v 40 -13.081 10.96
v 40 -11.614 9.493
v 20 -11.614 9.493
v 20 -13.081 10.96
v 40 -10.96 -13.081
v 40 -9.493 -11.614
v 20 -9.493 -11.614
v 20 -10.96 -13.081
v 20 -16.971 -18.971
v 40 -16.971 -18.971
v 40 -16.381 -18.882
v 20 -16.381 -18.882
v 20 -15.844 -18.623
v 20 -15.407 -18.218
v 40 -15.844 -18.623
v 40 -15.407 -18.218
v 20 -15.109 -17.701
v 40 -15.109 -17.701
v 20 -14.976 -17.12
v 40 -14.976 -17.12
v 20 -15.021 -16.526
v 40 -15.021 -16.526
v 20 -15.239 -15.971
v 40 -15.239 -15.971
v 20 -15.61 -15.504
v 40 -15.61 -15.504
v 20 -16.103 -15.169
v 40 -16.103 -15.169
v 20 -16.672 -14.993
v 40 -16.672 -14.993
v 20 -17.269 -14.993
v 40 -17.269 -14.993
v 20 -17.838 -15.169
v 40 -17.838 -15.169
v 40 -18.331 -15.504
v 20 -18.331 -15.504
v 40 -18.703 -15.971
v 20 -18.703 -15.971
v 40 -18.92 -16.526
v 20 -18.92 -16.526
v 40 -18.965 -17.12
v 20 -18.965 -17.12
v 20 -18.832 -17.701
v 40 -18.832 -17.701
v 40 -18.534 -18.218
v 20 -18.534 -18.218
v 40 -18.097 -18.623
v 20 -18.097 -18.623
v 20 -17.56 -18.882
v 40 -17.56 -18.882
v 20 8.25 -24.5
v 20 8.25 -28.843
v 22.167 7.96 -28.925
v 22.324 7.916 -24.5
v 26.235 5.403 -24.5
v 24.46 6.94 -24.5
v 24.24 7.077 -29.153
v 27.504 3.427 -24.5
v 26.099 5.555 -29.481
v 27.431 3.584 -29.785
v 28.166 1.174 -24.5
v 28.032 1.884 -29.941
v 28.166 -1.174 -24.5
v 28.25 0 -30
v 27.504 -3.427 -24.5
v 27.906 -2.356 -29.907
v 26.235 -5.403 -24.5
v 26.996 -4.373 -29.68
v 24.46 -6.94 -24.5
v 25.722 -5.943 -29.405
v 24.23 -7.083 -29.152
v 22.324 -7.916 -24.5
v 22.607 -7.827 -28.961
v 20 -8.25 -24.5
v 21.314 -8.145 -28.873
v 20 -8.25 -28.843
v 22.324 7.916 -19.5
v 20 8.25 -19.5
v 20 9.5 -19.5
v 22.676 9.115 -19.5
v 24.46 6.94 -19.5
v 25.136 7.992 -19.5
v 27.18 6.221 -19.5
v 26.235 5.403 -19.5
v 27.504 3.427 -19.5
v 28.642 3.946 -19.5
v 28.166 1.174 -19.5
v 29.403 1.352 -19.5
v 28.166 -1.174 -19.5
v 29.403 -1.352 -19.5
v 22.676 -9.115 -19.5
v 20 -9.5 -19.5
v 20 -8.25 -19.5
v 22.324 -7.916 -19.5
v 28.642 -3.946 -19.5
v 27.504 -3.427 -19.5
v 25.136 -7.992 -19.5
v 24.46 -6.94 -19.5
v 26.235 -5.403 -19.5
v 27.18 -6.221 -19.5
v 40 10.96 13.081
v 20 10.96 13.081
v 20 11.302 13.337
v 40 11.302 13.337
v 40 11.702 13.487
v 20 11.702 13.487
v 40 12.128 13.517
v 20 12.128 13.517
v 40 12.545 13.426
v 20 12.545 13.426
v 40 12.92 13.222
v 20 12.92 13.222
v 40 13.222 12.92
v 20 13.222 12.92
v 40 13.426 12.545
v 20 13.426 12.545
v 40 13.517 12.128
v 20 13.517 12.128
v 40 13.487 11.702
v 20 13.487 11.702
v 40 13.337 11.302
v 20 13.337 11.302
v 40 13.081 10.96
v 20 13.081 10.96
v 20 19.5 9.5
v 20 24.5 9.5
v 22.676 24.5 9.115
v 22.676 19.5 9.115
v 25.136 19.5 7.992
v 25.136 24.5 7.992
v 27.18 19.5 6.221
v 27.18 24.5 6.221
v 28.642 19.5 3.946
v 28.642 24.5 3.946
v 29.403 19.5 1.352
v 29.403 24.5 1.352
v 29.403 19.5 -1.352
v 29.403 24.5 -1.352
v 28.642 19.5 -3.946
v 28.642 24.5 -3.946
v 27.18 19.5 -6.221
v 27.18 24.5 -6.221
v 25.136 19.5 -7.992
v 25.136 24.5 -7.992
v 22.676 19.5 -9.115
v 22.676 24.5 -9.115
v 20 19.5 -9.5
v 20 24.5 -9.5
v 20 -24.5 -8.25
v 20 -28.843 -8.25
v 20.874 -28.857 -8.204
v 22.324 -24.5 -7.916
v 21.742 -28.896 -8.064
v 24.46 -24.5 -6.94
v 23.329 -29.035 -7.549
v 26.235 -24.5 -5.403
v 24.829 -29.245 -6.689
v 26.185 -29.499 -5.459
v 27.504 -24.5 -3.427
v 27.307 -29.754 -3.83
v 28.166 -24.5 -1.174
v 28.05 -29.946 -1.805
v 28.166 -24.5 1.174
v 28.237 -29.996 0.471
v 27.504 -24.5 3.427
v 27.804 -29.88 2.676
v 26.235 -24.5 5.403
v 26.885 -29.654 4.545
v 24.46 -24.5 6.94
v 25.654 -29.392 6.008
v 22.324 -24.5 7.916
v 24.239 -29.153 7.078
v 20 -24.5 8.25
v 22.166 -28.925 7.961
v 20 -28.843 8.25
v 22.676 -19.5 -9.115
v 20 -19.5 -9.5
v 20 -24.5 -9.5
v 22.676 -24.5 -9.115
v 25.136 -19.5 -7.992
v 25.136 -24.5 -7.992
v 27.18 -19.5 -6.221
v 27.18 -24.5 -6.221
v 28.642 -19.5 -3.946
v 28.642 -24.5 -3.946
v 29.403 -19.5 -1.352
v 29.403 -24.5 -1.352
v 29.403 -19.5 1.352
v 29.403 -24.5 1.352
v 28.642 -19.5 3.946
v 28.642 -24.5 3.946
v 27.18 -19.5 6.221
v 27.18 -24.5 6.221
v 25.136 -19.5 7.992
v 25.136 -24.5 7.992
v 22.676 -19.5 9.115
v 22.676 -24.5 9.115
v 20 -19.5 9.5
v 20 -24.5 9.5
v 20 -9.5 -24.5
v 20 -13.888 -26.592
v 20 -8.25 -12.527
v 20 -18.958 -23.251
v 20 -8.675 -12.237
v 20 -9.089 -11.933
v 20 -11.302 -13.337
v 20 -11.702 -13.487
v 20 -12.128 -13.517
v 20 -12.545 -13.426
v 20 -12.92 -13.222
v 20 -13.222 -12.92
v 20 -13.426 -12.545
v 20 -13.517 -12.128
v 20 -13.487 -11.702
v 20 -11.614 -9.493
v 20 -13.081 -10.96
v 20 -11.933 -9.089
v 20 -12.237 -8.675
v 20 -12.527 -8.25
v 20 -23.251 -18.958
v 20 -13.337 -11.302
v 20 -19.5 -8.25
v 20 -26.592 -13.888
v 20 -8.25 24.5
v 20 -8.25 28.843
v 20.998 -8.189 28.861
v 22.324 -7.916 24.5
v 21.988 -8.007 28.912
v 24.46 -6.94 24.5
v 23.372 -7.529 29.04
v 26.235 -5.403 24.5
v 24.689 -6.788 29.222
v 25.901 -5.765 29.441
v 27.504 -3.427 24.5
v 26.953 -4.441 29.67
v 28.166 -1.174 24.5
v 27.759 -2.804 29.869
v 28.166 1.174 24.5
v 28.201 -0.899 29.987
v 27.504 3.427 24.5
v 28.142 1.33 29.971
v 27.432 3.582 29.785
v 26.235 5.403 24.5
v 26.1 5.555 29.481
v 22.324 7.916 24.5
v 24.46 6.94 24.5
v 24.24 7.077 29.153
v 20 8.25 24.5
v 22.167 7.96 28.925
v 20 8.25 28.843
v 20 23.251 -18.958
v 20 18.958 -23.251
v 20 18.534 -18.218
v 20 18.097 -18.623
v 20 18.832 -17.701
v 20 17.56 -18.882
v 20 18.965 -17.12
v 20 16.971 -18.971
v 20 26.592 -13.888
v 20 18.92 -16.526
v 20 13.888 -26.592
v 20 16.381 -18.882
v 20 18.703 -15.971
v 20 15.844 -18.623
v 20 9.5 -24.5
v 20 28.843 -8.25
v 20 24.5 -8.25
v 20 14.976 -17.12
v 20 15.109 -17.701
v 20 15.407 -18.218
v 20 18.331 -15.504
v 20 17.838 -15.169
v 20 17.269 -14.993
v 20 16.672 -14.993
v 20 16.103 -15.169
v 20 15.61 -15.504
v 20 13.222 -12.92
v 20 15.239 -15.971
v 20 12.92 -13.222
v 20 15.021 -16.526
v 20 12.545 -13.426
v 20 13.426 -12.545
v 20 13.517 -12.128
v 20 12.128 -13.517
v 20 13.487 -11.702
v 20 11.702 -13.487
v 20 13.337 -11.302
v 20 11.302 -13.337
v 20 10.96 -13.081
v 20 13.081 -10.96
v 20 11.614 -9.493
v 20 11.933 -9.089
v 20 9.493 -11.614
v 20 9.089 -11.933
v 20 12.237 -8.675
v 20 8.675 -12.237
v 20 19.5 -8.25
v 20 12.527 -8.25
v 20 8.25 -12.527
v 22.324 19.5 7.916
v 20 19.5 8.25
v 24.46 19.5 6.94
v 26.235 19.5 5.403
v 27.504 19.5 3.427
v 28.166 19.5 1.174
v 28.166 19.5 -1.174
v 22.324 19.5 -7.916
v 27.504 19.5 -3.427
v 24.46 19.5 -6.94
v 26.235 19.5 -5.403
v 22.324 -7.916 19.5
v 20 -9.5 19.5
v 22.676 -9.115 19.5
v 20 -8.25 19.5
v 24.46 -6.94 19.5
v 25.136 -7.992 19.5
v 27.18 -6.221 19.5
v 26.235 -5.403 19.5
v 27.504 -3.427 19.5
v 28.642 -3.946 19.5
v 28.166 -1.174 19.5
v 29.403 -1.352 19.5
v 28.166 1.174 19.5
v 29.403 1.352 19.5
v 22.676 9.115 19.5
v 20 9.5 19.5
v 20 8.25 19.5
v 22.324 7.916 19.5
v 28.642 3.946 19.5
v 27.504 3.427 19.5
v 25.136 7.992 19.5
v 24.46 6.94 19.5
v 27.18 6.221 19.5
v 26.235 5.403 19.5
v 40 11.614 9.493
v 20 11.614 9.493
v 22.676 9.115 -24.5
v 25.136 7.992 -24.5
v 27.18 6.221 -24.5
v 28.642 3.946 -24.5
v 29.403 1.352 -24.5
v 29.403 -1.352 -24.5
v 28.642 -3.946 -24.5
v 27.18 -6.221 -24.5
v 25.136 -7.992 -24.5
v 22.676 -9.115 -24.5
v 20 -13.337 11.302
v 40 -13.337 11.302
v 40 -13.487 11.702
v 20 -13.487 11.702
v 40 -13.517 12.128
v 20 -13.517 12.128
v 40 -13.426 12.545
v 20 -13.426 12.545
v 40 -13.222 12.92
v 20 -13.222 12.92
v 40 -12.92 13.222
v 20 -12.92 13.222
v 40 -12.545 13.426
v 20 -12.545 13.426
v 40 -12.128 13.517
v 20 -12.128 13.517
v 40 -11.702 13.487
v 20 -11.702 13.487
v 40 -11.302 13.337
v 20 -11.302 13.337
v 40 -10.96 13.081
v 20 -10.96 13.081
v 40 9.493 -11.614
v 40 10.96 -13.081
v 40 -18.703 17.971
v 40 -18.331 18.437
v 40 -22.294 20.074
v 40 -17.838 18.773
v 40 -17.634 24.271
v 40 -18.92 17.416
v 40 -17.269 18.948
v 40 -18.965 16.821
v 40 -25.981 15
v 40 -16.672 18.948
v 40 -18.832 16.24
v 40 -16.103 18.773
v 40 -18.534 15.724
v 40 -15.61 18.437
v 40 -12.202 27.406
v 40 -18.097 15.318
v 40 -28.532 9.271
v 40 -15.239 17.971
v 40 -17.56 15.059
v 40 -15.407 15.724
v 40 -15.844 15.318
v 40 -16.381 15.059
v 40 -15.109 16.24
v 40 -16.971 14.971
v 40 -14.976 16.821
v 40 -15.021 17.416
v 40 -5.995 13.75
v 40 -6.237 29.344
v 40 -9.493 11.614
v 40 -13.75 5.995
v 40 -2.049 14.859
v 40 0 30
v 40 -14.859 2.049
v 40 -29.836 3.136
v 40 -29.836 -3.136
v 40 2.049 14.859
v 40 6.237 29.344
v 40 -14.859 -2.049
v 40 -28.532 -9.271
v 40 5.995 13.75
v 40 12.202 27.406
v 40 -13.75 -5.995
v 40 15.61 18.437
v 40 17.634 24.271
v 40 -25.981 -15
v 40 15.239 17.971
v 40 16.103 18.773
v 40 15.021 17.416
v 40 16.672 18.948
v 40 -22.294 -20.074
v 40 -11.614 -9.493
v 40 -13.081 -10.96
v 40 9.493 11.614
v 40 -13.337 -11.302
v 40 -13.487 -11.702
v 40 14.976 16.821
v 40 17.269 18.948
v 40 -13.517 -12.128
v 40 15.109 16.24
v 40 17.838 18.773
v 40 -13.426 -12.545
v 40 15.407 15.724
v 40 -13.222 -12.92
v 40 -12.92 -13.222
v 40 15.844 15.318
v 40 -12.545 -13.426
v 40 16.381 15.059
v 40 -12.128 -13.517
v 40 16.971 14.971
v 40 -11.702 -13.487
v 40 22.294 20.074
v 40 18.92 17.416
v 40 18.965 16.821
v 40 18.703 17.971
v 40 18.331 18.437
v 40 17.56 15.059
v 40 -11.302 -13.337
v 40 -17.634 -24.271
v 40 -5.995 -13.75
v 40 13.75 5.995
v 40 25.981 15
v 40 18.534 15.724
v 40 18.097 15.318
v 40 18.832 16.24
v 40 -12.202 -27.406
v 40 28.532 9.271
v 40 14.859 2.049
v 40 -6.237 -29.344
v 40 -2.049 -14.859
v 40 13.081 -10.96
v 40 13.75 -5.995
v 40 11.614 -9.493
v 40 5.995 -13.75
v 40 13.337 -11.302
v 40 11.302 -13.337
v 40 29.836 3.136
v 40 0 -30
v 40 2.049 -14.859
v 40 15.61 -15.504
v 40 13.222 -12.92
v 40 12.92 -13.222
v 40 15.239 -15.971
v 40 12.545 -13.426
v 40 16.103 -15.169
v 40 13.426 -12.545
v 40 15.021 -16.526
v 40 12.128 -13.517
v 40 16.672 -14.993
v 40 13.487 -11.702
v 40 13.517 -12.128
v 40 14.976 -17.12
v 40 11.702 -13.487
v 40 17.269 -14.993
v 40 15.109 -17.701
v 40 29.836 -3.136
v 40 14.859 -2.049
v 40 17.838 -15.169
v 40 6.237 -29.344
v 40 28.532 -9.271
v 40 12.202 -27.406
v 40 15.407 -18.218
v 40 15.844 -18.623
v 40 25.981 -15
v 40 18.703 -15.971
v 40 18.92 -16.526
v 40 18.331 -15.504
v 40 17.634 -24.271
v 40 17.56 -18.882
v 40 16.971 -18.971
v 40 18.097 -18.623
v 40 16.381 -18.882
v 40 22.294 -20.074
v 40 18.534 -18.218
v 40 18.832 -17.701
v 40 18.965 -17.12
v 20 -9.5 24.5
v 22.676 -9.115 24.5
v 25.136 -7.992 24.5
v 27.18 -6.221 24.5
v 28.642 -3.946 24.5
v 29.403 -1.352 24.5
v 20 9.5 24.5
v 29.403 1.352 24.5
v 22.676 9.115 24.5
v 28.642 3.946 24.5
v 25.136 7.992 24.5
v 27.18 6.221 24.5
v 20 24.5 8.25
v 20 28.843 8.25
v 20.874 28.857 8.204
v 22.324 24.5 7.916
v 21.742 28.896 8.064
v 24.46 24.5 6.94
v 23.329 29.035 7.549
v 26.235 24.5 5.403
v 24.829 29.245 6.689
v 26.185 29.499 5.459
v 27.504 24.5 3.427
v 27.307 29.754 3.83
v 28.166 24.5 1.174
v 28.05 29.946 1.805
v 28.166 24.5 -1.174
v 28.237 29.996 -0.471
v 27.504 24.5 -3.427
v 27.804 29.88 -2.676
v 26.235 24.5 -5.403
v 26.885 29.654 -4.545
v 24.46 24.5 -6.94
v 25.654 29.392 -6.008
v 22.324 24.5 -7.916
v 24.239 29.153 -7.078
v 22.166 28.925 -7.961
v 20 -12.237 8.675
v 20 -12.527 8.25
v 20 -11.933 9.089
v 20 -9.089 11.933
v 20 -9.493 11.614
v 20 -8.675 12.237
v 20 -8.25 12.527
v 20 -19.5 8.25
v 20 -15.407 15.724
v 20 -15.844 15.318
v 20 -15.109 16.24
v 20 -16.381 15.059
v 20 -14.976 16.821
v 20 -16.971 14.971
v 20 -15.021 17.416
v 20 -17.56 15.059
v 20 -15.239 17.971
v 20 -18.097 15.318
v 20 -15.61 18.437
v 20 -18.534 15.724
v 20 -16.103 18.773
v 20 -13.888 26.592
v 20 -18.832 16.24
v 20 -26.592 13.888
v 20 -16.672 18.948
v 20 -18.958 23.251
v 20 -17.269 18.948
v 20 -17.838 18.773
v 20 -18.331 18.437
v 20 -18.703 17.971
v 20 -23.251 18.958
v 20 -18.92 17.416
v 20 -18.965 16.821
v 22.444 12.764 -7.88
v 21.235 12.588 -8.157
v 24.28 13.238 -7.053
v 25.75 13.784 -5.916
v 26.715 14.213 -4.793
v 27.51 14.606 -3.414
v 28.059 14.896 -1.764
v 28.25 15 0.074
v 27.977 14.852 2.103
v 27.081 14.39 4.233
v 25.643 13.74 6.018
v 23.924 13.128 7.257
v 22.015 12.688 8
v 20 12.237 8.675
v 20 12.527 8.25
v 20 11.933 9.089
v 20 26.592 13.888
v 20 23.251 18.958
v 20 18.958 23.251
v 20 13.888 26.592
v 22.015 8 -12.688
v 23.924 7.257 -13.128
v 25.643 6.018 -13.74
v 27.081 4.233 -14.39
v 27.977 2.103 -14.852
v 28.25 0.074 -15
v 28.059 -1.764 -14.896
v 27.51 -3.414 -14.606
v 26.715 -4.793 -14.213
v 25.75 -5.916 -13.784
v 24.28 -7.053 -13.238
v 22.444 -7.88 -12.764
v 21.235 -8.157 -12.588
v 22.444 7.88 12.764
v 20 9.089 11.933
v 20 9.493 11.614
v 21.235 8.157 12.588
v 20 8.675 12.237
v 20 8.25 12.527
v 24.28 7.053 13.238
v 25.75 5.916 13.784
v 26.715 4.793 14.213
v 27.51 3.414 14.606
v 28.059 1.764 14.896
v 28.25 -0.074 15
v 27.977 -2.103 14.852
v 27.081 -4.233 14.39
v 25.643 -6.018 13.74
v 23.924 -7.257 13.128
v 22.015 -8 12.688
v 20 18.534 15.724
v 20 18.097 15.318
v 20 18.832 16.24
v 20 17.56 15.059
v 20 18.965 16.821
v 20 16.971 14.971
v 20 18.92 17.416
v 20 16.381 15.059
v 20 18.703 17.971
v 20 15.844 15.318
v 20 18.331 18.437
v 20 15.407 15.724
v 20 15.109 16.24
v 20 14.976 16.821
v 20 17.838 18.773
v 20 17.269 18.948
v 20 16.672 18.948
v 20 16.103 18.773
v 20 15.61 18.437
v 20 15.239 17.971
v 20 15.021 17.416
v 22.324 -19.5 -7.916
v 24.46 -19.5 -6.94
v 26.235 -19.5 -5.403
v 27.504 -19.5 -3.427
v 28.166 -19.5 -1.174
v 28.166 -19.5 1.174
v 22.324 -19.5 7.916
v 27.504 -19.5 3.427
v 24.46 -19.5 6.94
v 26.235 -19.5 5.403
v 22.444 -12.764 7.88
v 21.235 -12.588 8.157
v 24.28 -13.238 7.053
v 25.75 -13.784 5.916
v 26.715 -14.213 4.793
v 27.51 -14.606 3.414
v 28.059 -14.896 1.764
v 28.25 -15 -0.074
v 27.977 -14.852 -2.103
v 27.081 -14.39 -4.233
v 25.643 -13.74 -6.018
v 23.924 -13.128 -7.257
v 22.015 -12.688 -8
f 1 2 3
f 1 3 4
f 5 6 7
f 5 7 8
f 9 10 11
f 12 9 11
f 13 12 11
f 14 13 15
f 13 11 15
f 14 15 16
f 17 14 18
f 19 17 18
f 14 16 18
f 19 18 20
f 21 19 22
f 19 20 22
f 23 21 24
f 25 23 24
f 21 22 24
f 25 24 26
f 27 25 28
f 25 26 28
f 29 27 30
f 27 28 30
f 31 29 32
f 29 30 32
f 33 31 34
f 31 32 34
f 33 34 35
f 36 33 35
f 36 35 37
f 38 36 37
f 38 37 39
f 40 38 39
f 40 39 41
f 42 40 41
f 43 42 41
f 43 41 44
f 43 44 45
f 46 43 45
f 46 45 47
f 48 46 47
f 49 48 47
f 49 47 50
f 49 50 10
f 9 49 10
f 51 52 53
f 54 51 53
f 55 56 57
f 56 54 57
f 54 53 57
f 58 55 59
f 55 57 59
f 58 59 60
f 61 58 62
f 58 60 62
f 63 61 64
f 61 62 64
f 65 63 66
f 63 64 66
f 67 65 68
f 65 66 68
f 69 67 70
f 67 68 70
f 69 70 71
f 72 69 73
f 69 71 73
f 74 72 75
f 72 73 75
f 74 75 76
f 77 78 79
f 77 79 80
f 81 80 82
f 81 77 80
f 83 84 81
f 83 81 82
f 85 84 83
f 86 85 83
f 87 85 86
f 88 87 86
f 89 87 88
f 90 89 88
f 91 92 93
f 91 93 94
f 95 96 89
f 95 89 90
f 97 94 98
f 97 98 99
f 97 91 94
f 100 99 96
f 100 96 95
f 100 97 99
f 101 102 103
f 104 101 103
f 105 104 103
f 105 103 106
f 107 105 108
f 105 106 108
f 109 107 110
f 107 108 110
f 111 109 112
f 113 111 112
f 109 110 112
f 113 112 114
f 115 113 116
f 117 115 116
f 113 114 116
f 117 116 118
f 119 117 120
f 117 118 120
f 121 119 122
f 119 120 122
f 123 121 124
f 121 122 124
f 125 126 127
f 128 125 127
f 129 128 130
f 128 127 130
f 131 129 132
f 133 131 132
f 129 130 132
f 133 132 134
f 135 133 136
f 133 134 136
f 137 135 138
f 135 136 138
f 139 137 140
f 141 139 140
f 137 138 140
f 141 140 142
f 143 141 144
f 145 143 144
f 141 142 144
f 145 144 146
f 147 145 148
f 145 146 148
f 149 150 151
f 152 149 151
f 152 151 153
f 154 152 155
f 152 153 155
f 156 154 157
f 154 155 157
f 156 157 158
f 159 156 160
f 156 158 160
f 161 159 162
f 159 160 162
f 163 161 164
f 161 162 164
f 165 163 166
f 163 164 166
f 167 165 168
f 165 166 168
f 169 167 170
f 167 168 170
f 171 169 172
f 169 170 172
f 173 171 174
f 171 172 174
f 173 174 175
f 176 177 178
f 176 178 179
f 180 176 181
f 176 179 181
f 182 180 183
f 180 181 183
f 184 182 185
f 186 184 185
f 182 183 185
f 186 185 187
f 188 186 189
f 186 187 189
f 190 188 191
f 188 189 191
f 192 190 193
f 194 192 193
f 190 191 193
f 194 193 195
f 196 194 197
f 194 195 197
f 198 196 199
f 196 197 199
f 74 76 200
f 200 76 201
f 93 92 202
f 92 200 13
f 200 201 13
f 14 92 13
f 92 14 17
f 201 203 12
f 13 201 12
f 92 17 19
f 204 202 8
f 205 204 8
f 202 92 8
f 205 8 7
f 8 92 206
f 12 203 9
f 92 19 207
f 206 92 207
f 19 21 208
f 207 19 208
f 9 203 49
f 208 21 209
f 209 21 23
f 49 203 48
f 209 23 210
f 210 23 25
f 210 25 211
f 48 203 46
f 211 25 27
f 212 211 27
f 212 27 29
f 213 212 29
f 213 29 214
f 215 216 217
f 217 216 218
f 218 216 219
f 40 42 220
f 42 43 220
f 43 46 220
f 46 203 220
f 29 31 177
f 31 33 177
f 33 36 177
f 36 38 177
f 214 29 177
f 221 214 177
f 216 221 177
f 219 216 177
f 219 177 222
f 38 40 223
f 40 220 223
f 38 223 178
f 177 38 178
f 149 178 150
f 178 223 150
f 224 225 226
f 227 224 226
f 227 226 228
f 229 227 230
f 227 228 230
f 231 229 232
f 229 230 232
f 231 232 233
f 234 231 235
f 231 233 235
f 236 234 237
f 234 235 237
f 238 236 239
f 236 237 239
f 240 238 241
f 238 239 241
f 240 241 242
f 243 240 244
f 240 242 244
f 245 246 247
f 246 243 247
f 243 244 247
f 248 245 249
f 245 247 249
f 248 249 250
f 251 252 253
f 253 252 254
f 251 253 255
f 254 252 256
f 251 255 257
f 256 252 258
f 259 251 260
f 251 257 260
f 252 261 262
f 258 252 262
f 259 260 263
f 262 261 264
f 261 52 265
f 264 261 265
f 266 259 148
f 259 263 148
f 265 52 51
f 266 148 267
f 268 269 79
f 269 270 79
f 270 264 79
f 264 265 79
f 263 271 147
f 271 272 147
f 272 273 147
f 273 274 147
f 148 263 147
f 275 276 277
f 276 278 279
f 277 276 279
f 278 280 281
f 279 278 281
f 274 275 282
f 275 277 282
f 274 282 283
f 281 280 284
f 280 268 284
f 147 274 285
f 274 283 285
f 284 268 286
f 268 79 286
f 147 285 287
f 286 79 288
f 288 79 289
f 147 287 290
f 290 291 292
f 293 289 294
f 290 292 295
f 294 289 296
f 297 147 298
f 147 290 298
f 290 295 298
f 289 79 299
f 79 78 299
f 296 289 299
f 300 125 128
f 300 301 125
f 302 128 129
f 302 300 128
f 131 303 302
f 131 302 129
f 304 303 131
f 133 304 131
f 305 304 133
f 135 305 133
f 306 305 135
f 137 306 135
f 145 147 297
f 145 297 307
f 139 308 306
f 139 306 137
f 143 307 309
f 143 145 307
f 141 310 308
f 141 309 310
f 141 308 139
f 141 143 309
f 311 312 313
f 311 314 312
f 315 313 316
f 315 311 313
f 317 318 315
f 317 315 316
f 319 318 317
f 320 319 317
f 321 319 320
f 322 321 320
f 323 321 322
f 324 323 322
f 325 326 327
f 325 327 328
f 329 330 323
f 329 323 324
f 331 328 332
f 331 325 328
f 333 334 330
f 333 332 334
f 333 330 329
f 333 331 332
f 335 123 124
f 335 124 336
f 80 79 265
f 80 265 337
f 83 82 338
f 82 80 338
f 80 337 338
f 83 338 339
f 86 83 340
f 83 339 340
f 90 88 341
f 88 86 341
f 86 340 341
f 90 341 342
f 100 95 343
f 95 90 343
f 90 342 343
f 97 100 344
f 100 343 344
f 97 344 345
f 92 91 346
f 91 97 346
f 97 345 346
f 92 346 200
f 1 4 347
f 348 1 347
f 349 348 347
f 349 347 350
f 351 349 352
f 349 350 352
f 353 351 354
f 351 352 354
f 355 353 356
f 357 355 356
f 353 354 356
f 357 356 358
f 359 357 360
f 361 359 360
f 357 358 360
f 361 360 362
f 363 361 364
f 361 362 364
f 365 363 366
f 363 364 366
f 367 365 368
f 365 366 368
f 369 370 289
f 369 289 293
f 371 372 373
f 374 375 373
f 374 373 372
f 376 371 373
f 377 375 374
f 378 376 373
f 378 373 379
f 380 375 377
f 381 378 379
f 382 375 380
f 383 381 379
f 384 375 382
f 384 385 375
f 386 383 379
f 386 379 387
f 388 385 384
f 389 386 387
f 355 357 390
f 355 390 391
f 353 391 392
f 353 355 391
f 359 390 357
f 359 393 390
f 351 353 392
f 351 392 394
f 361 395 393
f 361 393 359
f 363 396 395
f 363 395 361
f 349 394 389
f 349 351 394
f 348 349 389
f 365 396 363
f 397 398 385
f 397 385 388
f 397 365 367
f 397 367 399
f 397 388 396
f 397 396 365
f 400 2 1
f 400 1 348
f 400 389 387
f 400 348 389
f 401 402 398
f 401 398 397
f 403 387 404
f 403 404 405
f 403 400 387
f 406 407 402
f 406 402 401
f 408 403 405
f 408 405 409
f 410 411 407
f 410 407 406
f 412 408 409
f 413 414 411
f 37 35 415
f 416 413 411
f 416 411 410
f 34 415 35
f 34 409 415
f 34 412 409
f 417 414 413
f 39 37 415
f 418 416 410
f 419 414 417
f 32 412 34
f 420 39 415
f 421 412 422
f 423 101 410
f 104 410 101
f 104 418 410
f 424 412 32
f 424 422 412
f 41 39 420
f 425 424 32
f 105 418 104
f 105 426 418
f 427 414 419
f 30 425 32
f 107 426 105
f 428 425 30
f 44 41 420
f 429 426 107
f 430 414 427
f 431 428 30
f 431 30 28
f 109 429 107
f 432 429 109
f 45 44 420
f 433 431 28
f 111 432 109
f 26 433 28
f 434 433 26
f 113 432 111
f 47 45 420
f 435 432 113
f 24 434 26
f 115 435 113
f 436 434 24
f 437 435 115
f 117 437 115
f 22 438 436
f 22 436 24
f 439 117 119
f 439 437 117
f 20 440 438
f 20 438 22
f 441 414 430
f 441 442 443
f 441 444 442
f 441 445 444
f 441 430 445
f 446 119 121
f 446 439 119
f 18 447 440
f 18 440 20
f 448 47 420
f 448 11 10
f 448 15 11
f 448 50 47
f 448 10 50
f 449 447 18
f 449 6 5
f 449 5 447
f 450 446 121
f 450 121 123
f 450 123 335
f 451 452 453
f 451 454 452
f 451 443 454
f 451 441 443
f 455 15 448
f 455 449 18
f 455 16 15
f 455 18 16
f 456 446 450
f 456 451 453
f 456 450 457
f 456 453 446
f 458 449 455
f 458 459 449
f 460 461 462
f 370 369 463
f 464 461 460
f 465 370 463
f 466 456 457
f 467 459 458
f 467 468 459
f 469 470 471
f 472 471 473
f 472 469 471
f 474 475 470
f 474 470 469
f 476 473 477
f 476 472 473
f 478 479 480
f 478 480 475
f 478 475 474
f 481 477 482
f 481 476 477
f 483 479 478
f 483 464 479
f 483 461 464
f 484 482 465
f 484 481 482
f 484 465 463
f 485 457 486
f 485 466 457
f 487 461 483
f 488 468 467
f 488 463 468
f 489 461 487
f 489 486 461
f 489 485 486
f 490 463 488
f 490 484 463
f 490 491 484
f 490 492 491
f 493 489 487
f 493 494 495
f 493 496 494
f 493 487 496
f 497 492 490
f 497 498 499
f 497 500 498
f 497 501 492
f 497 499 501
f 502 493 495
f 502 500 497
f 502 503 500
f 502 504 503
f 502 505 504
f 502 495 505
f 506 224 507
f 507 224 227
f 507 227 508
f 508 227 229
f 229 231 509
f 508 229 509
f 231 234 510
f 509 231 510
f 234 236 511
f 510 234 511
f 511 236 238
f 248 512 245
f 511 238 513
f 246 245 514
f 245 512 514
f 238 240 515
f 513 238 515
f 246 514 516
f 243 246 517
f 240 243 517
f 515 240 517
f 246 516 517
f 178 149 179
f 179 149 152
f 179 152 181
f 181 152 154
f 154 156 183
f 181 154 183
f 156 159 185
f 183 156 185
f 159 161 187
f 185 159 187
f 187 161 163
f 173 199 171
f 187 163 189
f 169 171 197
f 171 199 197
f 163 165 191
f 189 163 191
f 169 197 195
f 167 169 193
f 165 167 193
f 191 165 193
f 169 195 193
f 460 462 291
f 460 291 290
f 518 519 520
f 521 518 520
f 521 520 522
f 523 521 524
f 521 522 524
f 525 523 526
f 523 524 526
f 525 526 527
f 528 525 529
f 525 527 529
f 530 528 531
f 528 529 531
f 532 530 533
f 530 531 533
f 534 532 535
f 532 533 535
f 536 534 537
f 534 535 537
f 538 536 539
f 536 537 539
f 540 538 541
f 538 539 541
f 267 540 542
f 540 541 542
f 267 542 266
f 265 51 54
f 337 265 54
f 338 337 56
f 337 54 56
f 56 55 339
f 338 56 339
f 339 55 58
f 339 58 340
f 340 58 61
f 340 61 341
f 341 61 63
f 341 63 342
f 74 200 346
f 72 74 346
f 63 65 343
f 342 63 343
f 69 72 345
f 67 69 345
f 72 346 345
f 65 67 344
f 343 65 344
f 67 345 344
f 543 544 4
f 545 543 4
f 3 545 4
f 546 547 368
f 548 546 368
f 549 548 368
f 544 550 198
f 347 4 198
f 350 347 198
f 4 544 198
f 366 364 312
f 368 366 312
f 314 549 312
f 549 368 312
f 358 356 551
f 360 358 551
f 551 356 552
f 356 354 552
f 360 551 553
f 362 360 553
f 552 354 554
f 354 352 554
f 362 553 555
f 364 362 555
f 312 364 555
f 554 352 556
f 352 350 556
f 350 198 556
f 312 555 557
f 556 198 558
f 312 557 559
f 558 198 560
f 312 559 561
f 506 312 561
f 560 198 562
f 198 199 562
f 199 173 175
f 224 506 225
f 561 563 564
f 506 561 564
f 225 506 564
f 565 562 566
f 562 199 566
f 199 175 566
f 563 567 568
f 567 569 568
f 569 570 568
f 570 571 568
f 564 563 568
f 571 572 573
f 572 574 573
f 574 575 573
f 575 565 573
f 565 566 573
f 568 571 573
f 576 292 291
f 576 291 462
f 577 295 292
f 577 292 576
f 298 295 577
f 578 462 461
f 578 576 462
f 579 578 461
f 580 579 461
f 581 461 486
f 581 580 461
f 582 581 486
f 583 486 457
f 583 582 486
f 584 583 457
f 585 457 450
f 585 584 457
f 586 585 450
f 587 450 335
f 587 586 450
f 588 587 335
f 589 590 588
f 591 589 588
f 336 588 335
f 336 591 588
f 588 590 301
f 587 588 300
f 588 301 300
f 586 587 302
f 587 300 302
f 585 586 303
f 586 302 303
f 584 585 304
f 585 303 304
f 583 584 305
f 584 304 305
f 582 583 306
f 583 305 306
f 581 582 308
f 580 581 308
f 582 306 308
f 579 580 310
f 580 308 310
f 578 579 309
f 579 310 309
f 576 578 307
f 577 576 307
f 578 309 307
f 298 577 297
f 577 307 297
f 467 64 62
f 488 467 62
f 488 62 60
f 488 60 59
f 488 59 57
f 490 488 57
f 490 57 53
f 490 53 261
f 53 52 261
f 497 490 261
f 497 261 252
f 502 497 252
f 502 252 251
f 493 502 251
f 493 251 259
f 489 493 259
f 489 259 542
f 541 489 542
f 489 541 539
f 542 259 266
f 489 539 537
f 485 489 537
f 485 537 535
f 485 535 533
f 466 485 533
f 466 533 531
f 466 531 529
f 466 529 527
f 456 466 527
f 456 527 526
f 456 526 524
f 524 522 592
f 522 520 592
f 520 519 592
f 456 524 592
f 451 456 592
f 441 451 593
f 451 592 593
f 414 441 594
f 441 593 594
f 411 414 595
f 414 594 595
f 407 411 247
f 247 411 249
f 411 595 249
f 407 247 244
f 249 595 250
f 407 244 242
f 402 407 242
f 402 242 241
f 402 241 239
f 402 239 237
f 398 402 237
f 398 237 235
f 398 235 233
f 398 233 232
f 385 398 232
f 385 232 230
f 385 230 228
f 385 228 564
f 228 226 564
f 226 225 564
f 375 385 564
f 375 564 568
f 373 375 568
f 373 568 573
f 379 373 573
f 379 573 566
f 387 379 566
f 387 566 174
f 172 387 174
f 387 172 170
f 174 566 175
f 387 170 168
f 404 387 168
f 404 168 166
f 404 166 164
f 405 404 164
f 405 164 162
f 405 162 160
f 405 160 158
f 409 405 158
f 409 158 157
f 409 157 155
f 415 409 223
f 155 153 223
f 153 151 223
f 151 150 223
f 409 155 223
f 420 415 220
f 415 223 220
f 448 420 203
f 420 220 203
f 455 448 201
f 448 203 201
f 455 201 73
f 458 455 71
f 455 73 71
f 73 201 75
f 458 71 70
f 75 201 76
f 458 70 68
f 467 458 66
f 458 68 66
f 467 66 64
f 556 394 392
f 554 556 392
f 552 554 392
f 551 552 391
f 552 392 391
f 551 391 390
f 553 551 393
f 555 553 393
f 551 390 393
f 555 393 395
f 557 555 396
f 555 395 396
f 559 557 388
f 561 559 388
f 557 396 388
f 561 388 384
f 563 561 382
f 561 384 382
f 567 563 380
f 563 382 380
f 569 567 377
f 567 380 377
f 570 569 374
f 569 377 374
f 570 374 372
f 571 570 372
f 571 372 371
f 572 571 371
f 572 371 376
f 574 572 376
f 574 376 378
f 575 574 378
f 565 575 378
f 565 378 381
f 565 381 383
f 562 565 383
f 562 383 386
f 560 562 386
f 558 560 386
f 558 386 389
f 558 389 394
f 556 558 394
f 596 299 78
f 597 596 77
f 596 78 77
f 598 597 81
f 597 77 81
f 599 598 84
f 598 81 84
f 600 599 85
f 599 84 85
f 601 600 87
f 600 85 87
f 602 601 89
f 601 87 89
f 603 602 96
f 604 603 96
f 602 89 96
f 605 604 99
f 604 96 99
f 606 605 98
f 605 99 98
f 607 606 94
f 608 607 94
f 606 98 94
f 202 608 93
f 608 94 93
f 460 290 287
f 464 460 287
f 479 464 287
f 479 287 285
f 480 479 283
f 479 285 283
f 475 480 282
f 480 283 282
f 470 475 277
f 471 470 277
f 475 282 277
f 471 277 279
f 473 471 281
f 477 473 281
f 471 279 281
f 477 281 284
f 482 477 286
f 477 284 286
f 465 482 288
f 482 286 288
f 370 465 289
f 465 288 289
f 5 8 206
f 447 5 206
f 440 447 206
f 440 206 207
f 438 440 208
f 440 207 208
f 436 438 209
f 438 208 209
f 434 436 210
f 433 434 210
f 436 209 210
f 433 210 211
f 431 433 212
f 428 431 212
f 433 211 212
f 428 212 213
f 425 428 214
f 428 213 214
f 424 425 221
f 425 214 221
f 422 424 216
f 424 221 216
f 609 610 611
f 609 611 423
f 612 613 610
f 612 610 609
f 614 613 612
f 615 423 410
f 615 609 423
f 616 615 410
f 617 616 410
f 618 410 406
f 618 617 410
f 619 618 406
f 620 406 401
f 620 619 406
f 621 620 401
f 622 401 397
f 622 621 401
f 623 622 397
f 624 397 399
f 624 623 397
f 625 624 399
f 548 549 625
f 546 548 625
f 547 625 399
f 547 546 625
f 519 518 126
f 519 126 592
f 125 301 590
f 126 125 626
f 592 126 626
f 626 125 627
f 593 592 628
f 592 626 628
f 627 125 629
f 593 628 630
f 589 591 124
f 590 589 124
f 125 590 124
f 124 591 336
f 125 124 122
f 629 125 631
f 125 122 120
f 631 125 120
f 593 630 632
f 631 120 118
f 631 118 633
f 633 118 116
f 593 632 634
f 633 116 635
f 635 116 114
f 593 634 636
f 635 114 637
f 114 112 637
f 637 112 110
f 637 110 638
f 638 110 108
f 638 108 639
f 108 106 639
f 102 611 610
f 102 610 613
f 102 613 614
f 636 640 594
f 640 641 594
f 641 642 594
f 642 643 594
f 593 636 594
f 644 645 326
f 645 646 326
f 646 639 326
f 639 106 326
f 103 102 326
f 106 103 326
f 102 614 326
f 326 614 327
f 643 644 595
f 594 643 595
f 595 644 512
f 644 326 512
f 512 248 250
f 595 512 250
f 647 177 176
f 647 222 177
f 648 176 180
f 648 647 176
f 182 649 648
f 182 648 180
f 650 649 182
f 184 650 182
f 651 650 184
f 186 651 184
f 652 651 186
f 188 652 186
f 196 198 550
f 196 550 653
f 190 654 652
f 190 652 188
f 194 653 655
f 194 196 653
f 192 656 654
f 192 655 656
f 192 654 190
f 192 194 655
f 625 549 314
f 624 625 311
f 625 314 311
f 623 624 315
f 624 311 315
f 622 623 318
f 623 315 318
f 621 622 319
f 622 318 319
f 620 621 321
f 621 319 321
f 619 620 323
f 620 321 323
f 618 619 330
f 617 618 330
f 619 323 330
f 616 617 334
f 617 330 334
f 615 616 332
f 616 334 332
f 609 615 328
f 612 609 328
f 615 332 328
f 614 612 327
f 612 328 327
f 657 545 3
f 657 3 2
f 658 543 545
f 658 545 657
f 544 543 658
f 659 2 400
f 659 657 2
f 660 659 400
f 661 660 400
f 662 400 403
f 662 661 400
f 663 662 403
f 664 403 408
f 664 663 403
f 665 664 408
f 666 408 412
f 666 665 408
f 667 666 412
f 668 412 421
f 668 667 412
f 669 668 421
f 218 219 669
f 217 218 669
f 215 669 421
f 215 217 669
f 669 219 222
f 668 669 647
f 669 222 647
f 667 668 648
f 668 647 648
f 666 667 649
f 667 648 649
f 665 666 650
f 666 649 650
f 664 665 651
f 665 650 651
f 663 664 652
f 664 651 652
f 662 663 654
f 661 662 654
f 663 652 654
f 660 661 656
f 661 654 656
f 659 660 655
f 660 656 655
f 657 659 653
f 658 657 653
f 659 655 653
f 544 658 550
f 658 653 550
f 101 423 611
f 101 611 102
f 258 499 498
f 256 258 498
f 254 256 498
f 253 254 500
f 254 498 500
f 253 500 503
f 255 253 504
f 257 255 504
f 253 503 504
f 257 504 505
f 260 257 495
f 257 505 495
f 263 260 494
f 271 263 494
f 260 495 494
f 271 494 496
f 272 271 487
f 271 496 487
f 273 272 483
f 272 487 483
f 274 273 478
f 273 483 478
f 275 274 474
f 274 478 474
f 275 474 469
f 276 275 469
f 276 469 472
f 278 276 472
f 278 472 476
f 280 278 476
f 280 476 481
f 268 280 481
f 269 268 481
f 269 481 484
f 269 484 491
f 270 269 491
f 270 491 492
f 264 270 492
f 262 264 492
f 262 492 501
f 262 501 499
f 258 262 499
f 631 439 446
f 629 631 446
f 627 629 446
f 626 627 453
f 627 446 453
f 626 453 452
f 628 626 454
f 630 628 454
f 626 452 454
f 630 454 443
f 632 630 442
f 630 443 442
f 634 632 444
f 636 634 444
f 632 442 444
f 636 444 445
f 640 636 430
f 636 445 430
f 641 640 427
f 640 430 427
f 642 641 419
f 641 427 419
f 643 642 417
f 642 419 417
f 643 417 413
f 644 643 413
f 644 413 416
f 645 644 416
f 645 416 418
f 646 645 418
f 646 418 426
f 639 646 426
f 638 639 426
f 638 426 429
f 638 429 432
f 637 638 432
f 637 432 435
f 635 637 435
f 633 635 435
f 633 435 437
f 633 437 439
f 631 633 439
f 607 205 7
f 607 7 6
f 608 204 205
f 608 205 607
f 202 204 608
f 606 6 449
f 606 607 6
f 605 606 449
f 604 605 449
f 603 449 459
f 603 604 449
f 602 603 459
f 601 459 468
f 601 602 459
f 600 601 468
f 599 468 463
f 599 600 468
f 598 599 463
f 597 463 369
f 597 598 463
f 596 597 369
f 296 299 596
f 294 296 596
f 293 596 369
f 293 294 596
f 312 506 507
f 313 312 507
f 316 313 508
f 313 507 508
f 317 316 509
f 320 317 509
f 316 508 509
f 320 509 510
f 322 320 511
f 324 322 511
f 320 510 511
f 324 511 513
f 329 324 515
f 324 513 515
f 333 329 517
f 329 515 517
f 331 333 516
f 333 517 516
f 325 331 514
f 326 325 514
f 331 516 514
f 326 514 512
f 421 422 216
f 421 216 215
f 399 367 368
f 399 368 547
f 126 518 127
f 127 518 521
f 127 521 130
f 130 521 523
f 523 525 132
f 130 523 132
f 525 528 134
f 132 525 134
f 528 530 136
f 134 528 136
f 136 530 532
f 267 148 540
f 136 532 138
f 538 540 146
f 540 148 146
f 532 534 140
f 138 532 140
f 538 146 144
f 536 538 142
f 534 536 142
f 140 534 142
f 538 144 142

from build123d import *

# Parameters (mm, degrees)
SKETCH1_R           = 30
SKETCH1_R_2         = 15
BOSS_EXTRUDE1_DEPTH = 40
SKETCH2_R           = 9.5
CUT_EXTRUDE1_DEPTH  = 2.5
SKETCH3_R           = 8.25
CUT_EXTRUDE2_DEPTH  = 15
CIRPATTERN1_COUNT   = 4
SKETCH4_R           = 2
CUT_EXTRUDE3_DEPTH  = 47.904157769
CUT_EXTRUDE4_DEPTH  = 47.904157769


with BuildPart() as part:
    # Sketch1 → Boss-Extrude1 (new body)
    with BuildSketch(Plane(origin=(0, 0, 0), x_dir=(0, 0, -1), z_dir=(1, 0, 0))):
        Circle(SKETCH1_R)
        Circle(SKETCH1_R_2, mode=Mode.SUBTRACT)
    extrude(amount=BOSS_EXTRUDE1_DEPTH)

    # Sketch2 → Cut-Extrude1 (cut, symmetric)
    with BuildSketch(Plane.XY.offset(22)):
        with Locations((20, 0)):
            Circle(SKETCH2_R)
    cut_extrude1 = extrude(amount=CUT_EXTRUDE1_DEPTH, both=True, mode=Mode.SUBTRACT)

    # Sketch3 → Cut-Extrude2 (cut, symmetric)
    with BuildSketch(Plane.XY.offset(22)):
        with Locations((20, 0)):
            Circle(SKETCH3_R)
    cut_extrude2 = extrude(amount=CUT_EXTRUDE2_DEPTH, both=True, mode=Mode.SUBTRACT)

    # CirPattern1: Cut-Extrude1, Cut-Extrude2 ×4 about axis
    cirpattern1_axis = Axis((0, 0, 0), (1, 0, 0))
    add([cut_extrude1.rotate(cirpattern1_axis, i * 360 / CIRPATTERN1_COUNT) for i in range(1, CIRPATTERN1_COUNT)], mode=Mode.SUBTRACT)
    add([cut_extrude2.rotate(cirpattern1_axis, i * 360 / CIRPATTERN1_COUNT) for i in range(1, CIRPATTERN1_COUNT)], mode=Mode.SUBTRACT)


with BuildPart() as body_2:
    # Split2: the piece on the far side of the plane
    add(part.part)
    split(bisect_by=Plane(origin=(20, 0, 0), x_dir=(0, 0, 1), z_dir=(1, 0, 0)), keep=Keep.BOTTOM)


with BuildPart() as part_1:
    add(part.part)

    # Split2
    split(bisect_by=Plane(origin=(20, 0, 0), x_dir=(0, 0, 1), z_dir=(1, 0, 0)), keep=Keep.TOP)

    # Sketch4 → Cut-Extrude3 (cut, through all)
    with BuildSketch(Plane(origin=(40, 0, 0), x_dir=(0, 0, -1), z_dir=(1, 0, 0))):
        with Locations((-16.970562748, 16.970562748)):
            Circle(SKETCH4_R)
        with Locations((16.970562748, 16.970562748)):
            Circle(SKETCH4_R)
        with Locations((16.970562748, -16.970562748)):
            Circle(SKETCH4_R)
        with Locations((-16.970562748, -16.970562748)):
            Circle(SKETCH4_R)
    extrude(amount=-CUT_EXTRUDE3_DEPTH, mode=Mode.SUBTRACT)

    # Sketch5 → Cut-Extrude4 (cut, through all)
    with BuildSketch(Plane.ZY.offset(-20)):
        with BuildLine():
            ThreePointArc((-11.614095631, 9.492775288), (-11.124297731, 10.062305899), (-10.606601718, 10.606601718))
            ThreePointArc((-10.606601718, 10.606601718), (-10.062305899, 11.124297731), (-9.492775288, 11.614095631))
            Line((-9.492775288, 11.614095631), (-10.960155108, 13.081475452))
            ThreePointArc((-10.960155108, 13.081475452), (-13.081475452, 13.081475452), (-13.081475452, 10.960155108))
            Line((-13.081475452, 10.960155108), (-11.614095631, 9.492775288))
        make_face()
        with BuildLine():
            ThreePointArc((13.081475452, 10.960155108), (13.081475452, 13.081475452), (10.960155108, 13.081475452))
            Line((10.960155108, 13.081475452), (9.492775288, 11.614095631))
            ThreePointArc((9.492775288, 11.614095631), (10.606601718, 10.606601718), (11.614095631, 9.492775288))
            Line((11.614095631, 9.492775288), (13.081475452, 10.960155108))
        make_face()
        with BuildLine():
            ThreePointArc((10.960155108, -13.081475452), (13.081475452, -13.081475452), (13.081475452, -10.960155108))
            Line((13.081475452, -10.960155108), (11.614095631, -9.492775288))
            ThreePointArc((11.614095631, -9.492775288), (10.606601718, -10.606601718), (9.492775288, -11.614095631))
            Line((9.492775288, -11.614095631), (10.960155108, -13.081475452))
        make_face()
        with BuildLine():
            ThreePointArc((-13.081475452, -10.960155108), (-13.081475452, -13.081475452), (-10.960155108, -13.081475452))
            Line((-10.960155108, -13.081475452), (-9.492775288, -11.614095631))
            ThreePointArc((-9.492775288, -11.614095631), (-10.606601718, -10.606601718), (-11.614095631, -9.492775288))
            Line((-11.614095631, -9.492775288), (-13.081475452, -10.960155108))
        make_face()
    extrude(amount=-CUT_EXTRUDE4_DEPTH, mode=Mode.SUBTRACT)


solid = part_1.part
